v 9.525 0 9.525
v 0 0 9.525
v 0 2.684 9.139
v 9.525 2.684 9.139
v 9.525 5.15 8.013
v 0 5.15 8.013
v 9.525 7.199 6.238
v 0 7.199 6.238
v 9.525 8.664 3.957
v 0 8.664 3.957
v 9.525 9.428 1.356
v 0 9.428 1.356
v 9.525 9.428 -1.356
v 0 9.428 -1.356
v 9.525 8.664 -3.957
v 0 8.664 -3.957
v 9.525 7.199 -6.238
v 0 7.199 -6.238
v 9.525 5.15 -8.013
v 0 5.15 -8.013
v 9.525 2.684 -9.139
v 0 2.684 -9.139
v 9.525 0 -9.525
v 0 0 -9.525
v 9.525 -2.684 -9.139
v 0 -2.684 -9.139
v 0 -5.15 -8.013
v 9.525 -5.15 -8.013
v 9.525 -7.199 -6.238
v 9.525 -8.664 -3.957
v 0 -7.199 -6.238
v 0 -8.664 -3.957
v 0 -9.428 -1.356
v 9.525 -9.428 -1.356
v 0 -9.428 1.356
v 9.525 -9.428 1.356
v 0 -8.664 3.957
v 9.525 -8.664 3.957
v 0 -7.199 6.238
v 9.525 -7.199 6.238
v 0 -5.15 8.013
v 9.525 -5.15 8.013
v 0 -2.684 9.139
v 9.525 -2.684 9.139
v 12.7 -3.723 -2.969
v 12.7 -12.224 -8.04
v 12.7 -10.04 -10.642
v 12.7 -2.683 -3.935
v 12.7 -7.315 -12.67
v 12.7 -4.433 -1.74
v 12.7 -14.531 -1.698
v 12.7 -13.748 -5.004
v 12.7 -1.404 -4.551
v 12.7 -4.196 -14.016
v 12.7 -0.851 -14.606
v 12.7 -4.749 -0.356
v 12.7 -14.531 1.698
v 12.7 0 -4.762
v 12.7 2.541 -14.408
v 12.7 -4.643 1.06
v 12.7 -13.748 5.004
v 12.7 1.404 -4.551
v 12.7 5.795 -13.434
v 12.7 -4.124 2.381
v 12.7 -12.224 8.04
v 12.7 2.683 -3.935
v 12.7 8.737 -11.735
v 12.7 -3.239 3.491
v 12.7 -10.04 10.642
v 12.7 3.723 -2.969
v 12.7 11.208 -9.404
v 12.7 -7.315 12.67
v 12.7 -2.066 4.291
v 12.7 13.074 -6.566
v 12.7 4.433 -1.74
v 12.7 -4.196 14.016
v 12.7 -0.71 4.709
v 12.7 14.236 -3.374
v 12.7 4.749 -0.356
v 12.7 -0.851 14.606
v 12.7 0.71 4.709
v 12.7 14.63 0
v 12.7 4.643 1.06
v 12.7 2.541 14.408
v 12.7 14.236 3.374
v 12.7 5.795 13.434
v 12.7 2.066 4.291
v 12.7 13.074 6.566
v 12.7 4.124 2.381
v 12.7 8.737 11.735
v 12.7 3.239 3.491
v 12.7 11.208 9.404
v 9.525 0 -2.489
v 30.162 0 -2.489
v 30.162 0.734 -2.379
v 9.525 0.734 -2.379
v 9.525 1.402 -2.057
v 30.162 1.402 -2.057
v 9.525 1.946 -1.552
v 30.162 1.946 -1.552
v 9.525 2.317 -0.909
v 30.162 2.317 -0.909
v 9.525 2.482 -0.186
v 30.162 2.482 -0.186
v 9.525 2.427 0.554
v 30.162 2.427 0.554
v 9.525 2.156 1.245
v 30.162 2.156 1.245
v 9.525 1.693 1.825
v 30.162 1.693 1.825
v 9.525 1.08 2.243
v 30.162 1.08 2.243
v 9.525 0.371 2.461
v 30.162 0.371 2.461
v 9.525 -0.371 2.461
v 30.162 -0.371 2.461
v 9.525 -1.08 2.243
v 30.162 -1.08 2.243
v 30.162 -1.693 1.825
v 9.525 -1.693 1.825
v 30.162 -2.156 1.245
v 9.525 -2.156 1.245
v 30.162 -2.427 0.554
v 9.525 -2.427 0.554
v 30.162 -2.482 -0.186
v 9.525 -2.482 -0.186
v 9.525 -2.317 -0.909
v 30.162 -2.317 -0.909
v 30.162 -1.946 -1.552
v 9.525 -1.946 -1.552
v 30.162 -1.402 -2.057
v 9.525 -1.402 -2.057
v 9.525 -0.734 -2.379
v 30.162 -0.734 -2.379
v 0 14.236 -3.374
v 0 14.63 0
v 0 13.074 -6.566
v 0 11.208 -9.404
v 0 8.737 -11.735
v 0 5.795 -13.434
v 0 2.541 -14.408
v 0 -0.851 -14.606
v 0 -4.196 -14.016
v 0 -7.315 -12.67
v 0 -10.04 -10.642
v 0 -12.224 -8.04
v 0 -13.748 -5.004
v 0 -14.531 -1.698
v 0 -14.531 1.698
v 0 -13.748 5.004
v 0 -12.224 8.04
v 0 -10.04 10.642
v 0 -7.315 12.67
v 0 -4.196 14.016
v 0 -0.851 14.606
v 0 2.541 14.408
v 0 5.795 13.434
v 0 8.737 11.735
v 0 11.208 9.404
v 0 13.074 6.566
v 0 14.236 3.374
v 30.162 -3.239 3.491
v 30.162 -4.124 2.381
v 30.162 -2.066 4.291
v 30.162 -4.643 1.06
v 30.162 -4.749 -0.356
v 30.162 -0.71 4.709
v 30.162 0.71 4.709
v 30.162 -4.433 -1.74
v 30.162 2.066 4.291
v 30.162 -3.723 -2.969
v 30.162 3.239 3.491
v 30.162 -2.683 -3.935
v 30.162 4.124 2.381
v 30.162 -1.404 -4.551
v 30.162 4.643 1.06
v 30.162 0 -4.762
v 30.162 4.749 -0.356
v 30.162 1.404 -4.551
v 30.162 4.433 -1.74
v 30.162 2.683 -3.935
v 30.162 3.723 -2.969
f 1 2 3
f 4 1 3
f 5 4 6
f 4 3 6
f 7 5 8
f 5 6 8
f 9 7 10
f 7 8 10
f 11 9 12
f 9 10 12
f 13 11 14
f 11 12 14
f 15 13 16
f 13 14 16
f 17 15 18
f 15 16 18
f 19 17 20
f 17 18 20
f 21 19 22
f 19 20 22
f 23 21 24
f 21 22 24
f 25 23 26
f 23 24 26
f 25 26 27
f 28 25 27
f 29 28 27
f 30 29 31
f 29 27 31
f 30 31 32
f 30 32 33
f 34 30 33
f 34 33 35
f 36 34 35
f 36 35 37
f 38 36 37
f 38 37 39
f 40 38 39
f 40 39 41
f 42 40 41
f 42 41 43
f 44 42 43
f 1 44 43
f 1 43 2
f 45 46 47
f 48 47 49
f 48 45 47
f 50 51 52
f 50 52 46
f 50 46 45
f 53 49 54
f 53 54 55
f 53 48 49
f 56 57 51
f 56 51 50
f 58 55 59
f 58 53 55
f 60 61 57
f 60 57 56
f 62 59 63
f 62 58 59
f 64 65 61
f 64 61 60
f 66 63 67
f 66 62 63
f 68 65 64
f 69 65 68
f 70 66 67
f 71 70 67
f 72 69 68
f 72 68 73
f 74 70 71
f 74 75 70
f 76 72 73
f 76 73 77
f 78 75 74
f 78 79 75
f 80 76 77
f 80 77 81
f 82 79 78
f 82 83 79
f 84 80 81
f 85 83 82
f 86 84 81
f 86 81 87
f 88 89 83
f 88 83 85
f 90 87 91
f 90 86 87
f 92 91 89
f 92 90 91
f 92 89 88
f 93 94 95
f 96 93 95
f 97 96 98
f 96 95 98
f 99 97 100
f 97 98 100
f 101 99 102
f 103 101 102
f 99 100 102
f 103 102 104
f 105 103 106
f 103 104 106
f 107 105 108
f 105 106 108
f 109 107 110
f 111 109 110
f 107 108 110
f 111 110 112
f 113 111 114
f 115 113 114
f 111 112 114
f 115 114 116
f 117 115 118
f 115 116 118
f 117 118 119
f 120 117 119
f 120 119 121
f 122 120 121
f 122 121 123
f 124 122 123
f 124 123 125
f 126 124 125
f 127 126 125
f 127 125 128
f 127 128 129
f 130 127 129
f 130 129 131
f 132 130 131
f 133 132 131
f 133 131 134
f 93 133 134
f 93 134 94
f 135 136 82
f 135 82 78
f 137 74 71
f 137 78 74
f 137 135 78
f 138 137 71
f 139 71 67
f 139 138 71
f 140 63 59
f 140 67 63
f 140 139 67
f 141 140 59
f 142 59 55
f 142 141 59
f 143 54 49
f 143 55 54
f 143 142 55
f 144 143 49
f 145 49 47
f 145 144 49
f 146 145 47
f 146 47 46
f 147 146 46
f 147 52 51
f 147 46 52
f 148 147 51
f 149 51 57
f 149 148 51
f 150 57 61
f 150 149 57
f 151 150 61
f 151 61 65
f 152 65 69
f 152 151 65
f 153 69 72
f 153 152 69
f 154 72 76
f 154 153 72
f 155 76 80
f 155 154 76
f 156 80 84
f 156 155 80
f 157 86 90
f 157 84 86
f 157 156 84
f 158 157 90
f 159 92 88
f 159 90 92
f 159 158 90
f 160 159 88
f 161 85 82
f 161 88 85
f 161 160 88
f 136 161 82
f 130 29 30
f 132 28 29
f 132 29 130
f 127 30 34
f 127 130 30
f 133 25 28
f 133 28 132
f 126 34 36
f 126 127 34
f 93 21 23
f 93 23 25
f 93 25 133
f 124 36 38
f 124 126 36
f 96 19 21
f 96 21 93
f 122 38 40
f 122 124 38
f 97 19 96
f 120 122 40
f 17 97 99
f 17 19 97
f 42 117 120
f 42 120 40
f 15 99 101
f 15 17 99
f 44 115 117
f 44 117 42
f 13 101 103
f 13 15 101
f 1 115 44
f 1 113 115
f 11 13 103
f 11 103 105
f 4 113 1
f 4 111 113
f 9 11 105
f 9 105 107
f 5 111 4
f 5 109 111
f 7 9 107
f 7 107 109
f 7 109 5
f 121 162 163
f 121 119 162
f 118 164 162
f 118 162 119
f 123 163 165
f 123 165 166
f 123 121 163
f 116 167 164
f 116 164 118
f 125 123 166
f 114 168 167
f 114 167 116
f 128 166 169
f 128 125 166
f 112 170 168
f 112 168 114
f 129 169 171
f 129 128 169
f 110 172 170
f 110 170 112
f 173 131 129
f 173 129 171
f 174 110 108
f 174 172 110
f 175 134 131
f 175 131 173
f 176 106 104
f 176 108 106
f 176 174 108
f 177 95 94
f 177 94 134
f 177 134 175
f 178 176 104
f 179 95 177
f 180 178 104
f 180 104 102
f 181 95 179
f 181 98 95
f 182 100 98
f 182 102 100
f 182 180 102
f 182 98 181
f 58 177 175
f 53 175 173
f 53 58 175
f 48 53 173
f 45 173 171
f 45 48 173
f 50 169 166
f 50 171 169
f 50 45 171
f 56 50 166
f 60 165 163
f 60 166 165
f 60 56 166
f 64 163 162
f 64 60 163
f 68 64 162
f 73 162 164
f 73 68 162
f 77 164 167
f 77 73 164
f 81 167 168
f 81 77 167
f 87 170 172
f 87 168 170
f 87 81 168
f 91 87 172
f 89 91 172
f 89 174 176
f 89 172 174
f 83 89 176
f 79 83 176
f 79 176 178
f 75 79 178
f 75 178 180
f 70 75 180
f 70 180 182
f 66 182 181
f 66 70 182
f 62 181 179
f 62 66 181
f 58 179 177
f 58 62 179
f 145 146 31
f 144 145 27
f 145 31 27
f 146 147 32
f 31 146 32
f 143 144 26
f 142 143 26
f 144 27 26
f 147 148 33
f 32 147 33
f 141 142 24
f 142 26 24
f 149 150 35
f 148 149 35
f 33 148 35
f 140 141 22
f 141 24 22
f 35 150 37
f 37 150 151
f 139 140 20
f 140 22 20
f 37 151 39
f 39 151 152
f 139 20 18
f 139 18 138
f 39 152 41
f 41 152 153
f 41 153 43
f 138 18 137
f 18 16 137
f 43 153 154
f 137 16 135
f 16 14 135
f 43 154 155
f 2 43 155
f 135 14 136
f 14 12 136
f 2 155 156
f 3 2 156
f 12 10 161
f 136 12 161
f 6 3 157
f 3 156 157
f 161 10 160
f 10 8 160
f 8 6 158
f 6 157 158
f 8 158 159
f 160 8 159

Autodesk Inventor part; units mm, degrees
ref_plane "YZ Plane" through (0, 0, 0) normal (1, 0, 0) x (0, 1, 0)
ref_plane "XZ Plane" through (0, 0, 0) normal (0, 1, 0) x (-1, 0, 0)
ref_plane "XY Plane" through (0, 0, 0) normal (0, 0, 1) x (1, 0, 0)
sketch "Sketch3" plane through (0, 0, 0) normal (1, 0, 0) x (0, 1, 0)
  circle A0 centre (0, 0) radius 15.875 construction
  circle A1 centre (0, 0) radius 14.6304
  dimension "d8" = 31.75
  dimension "d9" = 1.2446
extrude "Extrusion3" add sketch "Sketch3" along normal blind 12.7
sketch "Sketch4" plane through (12.7, 0, 0) normal (1, 0, 0) x (0, 0, -1)
  circle A0 centre (0, 0) radius 4.7625
  dimension "d12" = 9.525
extrude "Extrusion4" add sketch "Sketch4" along normal blind 17.4625
sketch "Sketch5" plane through (30.1625, 0, 0) normal (1, 0, 0) x (0, 0, -1)
  circle A0 centre (0, 0) radius 2.4892
  dimension "d15" = 4.9784
extrude "Extrusion5" cut sketch "Sketch5" against normal through all
sketch "Sketch6" plane through (0, 0, 0) normal (-1, 0, 0) x (0, 0, 1)
  circle A0 centre (0, 0) radius 9.525
  dimension "d18" = 19.05
extrude "Extrusion6" cut sketch "Sketch6" against normal blind 9.525
properties part number "Long roller plug 2"
